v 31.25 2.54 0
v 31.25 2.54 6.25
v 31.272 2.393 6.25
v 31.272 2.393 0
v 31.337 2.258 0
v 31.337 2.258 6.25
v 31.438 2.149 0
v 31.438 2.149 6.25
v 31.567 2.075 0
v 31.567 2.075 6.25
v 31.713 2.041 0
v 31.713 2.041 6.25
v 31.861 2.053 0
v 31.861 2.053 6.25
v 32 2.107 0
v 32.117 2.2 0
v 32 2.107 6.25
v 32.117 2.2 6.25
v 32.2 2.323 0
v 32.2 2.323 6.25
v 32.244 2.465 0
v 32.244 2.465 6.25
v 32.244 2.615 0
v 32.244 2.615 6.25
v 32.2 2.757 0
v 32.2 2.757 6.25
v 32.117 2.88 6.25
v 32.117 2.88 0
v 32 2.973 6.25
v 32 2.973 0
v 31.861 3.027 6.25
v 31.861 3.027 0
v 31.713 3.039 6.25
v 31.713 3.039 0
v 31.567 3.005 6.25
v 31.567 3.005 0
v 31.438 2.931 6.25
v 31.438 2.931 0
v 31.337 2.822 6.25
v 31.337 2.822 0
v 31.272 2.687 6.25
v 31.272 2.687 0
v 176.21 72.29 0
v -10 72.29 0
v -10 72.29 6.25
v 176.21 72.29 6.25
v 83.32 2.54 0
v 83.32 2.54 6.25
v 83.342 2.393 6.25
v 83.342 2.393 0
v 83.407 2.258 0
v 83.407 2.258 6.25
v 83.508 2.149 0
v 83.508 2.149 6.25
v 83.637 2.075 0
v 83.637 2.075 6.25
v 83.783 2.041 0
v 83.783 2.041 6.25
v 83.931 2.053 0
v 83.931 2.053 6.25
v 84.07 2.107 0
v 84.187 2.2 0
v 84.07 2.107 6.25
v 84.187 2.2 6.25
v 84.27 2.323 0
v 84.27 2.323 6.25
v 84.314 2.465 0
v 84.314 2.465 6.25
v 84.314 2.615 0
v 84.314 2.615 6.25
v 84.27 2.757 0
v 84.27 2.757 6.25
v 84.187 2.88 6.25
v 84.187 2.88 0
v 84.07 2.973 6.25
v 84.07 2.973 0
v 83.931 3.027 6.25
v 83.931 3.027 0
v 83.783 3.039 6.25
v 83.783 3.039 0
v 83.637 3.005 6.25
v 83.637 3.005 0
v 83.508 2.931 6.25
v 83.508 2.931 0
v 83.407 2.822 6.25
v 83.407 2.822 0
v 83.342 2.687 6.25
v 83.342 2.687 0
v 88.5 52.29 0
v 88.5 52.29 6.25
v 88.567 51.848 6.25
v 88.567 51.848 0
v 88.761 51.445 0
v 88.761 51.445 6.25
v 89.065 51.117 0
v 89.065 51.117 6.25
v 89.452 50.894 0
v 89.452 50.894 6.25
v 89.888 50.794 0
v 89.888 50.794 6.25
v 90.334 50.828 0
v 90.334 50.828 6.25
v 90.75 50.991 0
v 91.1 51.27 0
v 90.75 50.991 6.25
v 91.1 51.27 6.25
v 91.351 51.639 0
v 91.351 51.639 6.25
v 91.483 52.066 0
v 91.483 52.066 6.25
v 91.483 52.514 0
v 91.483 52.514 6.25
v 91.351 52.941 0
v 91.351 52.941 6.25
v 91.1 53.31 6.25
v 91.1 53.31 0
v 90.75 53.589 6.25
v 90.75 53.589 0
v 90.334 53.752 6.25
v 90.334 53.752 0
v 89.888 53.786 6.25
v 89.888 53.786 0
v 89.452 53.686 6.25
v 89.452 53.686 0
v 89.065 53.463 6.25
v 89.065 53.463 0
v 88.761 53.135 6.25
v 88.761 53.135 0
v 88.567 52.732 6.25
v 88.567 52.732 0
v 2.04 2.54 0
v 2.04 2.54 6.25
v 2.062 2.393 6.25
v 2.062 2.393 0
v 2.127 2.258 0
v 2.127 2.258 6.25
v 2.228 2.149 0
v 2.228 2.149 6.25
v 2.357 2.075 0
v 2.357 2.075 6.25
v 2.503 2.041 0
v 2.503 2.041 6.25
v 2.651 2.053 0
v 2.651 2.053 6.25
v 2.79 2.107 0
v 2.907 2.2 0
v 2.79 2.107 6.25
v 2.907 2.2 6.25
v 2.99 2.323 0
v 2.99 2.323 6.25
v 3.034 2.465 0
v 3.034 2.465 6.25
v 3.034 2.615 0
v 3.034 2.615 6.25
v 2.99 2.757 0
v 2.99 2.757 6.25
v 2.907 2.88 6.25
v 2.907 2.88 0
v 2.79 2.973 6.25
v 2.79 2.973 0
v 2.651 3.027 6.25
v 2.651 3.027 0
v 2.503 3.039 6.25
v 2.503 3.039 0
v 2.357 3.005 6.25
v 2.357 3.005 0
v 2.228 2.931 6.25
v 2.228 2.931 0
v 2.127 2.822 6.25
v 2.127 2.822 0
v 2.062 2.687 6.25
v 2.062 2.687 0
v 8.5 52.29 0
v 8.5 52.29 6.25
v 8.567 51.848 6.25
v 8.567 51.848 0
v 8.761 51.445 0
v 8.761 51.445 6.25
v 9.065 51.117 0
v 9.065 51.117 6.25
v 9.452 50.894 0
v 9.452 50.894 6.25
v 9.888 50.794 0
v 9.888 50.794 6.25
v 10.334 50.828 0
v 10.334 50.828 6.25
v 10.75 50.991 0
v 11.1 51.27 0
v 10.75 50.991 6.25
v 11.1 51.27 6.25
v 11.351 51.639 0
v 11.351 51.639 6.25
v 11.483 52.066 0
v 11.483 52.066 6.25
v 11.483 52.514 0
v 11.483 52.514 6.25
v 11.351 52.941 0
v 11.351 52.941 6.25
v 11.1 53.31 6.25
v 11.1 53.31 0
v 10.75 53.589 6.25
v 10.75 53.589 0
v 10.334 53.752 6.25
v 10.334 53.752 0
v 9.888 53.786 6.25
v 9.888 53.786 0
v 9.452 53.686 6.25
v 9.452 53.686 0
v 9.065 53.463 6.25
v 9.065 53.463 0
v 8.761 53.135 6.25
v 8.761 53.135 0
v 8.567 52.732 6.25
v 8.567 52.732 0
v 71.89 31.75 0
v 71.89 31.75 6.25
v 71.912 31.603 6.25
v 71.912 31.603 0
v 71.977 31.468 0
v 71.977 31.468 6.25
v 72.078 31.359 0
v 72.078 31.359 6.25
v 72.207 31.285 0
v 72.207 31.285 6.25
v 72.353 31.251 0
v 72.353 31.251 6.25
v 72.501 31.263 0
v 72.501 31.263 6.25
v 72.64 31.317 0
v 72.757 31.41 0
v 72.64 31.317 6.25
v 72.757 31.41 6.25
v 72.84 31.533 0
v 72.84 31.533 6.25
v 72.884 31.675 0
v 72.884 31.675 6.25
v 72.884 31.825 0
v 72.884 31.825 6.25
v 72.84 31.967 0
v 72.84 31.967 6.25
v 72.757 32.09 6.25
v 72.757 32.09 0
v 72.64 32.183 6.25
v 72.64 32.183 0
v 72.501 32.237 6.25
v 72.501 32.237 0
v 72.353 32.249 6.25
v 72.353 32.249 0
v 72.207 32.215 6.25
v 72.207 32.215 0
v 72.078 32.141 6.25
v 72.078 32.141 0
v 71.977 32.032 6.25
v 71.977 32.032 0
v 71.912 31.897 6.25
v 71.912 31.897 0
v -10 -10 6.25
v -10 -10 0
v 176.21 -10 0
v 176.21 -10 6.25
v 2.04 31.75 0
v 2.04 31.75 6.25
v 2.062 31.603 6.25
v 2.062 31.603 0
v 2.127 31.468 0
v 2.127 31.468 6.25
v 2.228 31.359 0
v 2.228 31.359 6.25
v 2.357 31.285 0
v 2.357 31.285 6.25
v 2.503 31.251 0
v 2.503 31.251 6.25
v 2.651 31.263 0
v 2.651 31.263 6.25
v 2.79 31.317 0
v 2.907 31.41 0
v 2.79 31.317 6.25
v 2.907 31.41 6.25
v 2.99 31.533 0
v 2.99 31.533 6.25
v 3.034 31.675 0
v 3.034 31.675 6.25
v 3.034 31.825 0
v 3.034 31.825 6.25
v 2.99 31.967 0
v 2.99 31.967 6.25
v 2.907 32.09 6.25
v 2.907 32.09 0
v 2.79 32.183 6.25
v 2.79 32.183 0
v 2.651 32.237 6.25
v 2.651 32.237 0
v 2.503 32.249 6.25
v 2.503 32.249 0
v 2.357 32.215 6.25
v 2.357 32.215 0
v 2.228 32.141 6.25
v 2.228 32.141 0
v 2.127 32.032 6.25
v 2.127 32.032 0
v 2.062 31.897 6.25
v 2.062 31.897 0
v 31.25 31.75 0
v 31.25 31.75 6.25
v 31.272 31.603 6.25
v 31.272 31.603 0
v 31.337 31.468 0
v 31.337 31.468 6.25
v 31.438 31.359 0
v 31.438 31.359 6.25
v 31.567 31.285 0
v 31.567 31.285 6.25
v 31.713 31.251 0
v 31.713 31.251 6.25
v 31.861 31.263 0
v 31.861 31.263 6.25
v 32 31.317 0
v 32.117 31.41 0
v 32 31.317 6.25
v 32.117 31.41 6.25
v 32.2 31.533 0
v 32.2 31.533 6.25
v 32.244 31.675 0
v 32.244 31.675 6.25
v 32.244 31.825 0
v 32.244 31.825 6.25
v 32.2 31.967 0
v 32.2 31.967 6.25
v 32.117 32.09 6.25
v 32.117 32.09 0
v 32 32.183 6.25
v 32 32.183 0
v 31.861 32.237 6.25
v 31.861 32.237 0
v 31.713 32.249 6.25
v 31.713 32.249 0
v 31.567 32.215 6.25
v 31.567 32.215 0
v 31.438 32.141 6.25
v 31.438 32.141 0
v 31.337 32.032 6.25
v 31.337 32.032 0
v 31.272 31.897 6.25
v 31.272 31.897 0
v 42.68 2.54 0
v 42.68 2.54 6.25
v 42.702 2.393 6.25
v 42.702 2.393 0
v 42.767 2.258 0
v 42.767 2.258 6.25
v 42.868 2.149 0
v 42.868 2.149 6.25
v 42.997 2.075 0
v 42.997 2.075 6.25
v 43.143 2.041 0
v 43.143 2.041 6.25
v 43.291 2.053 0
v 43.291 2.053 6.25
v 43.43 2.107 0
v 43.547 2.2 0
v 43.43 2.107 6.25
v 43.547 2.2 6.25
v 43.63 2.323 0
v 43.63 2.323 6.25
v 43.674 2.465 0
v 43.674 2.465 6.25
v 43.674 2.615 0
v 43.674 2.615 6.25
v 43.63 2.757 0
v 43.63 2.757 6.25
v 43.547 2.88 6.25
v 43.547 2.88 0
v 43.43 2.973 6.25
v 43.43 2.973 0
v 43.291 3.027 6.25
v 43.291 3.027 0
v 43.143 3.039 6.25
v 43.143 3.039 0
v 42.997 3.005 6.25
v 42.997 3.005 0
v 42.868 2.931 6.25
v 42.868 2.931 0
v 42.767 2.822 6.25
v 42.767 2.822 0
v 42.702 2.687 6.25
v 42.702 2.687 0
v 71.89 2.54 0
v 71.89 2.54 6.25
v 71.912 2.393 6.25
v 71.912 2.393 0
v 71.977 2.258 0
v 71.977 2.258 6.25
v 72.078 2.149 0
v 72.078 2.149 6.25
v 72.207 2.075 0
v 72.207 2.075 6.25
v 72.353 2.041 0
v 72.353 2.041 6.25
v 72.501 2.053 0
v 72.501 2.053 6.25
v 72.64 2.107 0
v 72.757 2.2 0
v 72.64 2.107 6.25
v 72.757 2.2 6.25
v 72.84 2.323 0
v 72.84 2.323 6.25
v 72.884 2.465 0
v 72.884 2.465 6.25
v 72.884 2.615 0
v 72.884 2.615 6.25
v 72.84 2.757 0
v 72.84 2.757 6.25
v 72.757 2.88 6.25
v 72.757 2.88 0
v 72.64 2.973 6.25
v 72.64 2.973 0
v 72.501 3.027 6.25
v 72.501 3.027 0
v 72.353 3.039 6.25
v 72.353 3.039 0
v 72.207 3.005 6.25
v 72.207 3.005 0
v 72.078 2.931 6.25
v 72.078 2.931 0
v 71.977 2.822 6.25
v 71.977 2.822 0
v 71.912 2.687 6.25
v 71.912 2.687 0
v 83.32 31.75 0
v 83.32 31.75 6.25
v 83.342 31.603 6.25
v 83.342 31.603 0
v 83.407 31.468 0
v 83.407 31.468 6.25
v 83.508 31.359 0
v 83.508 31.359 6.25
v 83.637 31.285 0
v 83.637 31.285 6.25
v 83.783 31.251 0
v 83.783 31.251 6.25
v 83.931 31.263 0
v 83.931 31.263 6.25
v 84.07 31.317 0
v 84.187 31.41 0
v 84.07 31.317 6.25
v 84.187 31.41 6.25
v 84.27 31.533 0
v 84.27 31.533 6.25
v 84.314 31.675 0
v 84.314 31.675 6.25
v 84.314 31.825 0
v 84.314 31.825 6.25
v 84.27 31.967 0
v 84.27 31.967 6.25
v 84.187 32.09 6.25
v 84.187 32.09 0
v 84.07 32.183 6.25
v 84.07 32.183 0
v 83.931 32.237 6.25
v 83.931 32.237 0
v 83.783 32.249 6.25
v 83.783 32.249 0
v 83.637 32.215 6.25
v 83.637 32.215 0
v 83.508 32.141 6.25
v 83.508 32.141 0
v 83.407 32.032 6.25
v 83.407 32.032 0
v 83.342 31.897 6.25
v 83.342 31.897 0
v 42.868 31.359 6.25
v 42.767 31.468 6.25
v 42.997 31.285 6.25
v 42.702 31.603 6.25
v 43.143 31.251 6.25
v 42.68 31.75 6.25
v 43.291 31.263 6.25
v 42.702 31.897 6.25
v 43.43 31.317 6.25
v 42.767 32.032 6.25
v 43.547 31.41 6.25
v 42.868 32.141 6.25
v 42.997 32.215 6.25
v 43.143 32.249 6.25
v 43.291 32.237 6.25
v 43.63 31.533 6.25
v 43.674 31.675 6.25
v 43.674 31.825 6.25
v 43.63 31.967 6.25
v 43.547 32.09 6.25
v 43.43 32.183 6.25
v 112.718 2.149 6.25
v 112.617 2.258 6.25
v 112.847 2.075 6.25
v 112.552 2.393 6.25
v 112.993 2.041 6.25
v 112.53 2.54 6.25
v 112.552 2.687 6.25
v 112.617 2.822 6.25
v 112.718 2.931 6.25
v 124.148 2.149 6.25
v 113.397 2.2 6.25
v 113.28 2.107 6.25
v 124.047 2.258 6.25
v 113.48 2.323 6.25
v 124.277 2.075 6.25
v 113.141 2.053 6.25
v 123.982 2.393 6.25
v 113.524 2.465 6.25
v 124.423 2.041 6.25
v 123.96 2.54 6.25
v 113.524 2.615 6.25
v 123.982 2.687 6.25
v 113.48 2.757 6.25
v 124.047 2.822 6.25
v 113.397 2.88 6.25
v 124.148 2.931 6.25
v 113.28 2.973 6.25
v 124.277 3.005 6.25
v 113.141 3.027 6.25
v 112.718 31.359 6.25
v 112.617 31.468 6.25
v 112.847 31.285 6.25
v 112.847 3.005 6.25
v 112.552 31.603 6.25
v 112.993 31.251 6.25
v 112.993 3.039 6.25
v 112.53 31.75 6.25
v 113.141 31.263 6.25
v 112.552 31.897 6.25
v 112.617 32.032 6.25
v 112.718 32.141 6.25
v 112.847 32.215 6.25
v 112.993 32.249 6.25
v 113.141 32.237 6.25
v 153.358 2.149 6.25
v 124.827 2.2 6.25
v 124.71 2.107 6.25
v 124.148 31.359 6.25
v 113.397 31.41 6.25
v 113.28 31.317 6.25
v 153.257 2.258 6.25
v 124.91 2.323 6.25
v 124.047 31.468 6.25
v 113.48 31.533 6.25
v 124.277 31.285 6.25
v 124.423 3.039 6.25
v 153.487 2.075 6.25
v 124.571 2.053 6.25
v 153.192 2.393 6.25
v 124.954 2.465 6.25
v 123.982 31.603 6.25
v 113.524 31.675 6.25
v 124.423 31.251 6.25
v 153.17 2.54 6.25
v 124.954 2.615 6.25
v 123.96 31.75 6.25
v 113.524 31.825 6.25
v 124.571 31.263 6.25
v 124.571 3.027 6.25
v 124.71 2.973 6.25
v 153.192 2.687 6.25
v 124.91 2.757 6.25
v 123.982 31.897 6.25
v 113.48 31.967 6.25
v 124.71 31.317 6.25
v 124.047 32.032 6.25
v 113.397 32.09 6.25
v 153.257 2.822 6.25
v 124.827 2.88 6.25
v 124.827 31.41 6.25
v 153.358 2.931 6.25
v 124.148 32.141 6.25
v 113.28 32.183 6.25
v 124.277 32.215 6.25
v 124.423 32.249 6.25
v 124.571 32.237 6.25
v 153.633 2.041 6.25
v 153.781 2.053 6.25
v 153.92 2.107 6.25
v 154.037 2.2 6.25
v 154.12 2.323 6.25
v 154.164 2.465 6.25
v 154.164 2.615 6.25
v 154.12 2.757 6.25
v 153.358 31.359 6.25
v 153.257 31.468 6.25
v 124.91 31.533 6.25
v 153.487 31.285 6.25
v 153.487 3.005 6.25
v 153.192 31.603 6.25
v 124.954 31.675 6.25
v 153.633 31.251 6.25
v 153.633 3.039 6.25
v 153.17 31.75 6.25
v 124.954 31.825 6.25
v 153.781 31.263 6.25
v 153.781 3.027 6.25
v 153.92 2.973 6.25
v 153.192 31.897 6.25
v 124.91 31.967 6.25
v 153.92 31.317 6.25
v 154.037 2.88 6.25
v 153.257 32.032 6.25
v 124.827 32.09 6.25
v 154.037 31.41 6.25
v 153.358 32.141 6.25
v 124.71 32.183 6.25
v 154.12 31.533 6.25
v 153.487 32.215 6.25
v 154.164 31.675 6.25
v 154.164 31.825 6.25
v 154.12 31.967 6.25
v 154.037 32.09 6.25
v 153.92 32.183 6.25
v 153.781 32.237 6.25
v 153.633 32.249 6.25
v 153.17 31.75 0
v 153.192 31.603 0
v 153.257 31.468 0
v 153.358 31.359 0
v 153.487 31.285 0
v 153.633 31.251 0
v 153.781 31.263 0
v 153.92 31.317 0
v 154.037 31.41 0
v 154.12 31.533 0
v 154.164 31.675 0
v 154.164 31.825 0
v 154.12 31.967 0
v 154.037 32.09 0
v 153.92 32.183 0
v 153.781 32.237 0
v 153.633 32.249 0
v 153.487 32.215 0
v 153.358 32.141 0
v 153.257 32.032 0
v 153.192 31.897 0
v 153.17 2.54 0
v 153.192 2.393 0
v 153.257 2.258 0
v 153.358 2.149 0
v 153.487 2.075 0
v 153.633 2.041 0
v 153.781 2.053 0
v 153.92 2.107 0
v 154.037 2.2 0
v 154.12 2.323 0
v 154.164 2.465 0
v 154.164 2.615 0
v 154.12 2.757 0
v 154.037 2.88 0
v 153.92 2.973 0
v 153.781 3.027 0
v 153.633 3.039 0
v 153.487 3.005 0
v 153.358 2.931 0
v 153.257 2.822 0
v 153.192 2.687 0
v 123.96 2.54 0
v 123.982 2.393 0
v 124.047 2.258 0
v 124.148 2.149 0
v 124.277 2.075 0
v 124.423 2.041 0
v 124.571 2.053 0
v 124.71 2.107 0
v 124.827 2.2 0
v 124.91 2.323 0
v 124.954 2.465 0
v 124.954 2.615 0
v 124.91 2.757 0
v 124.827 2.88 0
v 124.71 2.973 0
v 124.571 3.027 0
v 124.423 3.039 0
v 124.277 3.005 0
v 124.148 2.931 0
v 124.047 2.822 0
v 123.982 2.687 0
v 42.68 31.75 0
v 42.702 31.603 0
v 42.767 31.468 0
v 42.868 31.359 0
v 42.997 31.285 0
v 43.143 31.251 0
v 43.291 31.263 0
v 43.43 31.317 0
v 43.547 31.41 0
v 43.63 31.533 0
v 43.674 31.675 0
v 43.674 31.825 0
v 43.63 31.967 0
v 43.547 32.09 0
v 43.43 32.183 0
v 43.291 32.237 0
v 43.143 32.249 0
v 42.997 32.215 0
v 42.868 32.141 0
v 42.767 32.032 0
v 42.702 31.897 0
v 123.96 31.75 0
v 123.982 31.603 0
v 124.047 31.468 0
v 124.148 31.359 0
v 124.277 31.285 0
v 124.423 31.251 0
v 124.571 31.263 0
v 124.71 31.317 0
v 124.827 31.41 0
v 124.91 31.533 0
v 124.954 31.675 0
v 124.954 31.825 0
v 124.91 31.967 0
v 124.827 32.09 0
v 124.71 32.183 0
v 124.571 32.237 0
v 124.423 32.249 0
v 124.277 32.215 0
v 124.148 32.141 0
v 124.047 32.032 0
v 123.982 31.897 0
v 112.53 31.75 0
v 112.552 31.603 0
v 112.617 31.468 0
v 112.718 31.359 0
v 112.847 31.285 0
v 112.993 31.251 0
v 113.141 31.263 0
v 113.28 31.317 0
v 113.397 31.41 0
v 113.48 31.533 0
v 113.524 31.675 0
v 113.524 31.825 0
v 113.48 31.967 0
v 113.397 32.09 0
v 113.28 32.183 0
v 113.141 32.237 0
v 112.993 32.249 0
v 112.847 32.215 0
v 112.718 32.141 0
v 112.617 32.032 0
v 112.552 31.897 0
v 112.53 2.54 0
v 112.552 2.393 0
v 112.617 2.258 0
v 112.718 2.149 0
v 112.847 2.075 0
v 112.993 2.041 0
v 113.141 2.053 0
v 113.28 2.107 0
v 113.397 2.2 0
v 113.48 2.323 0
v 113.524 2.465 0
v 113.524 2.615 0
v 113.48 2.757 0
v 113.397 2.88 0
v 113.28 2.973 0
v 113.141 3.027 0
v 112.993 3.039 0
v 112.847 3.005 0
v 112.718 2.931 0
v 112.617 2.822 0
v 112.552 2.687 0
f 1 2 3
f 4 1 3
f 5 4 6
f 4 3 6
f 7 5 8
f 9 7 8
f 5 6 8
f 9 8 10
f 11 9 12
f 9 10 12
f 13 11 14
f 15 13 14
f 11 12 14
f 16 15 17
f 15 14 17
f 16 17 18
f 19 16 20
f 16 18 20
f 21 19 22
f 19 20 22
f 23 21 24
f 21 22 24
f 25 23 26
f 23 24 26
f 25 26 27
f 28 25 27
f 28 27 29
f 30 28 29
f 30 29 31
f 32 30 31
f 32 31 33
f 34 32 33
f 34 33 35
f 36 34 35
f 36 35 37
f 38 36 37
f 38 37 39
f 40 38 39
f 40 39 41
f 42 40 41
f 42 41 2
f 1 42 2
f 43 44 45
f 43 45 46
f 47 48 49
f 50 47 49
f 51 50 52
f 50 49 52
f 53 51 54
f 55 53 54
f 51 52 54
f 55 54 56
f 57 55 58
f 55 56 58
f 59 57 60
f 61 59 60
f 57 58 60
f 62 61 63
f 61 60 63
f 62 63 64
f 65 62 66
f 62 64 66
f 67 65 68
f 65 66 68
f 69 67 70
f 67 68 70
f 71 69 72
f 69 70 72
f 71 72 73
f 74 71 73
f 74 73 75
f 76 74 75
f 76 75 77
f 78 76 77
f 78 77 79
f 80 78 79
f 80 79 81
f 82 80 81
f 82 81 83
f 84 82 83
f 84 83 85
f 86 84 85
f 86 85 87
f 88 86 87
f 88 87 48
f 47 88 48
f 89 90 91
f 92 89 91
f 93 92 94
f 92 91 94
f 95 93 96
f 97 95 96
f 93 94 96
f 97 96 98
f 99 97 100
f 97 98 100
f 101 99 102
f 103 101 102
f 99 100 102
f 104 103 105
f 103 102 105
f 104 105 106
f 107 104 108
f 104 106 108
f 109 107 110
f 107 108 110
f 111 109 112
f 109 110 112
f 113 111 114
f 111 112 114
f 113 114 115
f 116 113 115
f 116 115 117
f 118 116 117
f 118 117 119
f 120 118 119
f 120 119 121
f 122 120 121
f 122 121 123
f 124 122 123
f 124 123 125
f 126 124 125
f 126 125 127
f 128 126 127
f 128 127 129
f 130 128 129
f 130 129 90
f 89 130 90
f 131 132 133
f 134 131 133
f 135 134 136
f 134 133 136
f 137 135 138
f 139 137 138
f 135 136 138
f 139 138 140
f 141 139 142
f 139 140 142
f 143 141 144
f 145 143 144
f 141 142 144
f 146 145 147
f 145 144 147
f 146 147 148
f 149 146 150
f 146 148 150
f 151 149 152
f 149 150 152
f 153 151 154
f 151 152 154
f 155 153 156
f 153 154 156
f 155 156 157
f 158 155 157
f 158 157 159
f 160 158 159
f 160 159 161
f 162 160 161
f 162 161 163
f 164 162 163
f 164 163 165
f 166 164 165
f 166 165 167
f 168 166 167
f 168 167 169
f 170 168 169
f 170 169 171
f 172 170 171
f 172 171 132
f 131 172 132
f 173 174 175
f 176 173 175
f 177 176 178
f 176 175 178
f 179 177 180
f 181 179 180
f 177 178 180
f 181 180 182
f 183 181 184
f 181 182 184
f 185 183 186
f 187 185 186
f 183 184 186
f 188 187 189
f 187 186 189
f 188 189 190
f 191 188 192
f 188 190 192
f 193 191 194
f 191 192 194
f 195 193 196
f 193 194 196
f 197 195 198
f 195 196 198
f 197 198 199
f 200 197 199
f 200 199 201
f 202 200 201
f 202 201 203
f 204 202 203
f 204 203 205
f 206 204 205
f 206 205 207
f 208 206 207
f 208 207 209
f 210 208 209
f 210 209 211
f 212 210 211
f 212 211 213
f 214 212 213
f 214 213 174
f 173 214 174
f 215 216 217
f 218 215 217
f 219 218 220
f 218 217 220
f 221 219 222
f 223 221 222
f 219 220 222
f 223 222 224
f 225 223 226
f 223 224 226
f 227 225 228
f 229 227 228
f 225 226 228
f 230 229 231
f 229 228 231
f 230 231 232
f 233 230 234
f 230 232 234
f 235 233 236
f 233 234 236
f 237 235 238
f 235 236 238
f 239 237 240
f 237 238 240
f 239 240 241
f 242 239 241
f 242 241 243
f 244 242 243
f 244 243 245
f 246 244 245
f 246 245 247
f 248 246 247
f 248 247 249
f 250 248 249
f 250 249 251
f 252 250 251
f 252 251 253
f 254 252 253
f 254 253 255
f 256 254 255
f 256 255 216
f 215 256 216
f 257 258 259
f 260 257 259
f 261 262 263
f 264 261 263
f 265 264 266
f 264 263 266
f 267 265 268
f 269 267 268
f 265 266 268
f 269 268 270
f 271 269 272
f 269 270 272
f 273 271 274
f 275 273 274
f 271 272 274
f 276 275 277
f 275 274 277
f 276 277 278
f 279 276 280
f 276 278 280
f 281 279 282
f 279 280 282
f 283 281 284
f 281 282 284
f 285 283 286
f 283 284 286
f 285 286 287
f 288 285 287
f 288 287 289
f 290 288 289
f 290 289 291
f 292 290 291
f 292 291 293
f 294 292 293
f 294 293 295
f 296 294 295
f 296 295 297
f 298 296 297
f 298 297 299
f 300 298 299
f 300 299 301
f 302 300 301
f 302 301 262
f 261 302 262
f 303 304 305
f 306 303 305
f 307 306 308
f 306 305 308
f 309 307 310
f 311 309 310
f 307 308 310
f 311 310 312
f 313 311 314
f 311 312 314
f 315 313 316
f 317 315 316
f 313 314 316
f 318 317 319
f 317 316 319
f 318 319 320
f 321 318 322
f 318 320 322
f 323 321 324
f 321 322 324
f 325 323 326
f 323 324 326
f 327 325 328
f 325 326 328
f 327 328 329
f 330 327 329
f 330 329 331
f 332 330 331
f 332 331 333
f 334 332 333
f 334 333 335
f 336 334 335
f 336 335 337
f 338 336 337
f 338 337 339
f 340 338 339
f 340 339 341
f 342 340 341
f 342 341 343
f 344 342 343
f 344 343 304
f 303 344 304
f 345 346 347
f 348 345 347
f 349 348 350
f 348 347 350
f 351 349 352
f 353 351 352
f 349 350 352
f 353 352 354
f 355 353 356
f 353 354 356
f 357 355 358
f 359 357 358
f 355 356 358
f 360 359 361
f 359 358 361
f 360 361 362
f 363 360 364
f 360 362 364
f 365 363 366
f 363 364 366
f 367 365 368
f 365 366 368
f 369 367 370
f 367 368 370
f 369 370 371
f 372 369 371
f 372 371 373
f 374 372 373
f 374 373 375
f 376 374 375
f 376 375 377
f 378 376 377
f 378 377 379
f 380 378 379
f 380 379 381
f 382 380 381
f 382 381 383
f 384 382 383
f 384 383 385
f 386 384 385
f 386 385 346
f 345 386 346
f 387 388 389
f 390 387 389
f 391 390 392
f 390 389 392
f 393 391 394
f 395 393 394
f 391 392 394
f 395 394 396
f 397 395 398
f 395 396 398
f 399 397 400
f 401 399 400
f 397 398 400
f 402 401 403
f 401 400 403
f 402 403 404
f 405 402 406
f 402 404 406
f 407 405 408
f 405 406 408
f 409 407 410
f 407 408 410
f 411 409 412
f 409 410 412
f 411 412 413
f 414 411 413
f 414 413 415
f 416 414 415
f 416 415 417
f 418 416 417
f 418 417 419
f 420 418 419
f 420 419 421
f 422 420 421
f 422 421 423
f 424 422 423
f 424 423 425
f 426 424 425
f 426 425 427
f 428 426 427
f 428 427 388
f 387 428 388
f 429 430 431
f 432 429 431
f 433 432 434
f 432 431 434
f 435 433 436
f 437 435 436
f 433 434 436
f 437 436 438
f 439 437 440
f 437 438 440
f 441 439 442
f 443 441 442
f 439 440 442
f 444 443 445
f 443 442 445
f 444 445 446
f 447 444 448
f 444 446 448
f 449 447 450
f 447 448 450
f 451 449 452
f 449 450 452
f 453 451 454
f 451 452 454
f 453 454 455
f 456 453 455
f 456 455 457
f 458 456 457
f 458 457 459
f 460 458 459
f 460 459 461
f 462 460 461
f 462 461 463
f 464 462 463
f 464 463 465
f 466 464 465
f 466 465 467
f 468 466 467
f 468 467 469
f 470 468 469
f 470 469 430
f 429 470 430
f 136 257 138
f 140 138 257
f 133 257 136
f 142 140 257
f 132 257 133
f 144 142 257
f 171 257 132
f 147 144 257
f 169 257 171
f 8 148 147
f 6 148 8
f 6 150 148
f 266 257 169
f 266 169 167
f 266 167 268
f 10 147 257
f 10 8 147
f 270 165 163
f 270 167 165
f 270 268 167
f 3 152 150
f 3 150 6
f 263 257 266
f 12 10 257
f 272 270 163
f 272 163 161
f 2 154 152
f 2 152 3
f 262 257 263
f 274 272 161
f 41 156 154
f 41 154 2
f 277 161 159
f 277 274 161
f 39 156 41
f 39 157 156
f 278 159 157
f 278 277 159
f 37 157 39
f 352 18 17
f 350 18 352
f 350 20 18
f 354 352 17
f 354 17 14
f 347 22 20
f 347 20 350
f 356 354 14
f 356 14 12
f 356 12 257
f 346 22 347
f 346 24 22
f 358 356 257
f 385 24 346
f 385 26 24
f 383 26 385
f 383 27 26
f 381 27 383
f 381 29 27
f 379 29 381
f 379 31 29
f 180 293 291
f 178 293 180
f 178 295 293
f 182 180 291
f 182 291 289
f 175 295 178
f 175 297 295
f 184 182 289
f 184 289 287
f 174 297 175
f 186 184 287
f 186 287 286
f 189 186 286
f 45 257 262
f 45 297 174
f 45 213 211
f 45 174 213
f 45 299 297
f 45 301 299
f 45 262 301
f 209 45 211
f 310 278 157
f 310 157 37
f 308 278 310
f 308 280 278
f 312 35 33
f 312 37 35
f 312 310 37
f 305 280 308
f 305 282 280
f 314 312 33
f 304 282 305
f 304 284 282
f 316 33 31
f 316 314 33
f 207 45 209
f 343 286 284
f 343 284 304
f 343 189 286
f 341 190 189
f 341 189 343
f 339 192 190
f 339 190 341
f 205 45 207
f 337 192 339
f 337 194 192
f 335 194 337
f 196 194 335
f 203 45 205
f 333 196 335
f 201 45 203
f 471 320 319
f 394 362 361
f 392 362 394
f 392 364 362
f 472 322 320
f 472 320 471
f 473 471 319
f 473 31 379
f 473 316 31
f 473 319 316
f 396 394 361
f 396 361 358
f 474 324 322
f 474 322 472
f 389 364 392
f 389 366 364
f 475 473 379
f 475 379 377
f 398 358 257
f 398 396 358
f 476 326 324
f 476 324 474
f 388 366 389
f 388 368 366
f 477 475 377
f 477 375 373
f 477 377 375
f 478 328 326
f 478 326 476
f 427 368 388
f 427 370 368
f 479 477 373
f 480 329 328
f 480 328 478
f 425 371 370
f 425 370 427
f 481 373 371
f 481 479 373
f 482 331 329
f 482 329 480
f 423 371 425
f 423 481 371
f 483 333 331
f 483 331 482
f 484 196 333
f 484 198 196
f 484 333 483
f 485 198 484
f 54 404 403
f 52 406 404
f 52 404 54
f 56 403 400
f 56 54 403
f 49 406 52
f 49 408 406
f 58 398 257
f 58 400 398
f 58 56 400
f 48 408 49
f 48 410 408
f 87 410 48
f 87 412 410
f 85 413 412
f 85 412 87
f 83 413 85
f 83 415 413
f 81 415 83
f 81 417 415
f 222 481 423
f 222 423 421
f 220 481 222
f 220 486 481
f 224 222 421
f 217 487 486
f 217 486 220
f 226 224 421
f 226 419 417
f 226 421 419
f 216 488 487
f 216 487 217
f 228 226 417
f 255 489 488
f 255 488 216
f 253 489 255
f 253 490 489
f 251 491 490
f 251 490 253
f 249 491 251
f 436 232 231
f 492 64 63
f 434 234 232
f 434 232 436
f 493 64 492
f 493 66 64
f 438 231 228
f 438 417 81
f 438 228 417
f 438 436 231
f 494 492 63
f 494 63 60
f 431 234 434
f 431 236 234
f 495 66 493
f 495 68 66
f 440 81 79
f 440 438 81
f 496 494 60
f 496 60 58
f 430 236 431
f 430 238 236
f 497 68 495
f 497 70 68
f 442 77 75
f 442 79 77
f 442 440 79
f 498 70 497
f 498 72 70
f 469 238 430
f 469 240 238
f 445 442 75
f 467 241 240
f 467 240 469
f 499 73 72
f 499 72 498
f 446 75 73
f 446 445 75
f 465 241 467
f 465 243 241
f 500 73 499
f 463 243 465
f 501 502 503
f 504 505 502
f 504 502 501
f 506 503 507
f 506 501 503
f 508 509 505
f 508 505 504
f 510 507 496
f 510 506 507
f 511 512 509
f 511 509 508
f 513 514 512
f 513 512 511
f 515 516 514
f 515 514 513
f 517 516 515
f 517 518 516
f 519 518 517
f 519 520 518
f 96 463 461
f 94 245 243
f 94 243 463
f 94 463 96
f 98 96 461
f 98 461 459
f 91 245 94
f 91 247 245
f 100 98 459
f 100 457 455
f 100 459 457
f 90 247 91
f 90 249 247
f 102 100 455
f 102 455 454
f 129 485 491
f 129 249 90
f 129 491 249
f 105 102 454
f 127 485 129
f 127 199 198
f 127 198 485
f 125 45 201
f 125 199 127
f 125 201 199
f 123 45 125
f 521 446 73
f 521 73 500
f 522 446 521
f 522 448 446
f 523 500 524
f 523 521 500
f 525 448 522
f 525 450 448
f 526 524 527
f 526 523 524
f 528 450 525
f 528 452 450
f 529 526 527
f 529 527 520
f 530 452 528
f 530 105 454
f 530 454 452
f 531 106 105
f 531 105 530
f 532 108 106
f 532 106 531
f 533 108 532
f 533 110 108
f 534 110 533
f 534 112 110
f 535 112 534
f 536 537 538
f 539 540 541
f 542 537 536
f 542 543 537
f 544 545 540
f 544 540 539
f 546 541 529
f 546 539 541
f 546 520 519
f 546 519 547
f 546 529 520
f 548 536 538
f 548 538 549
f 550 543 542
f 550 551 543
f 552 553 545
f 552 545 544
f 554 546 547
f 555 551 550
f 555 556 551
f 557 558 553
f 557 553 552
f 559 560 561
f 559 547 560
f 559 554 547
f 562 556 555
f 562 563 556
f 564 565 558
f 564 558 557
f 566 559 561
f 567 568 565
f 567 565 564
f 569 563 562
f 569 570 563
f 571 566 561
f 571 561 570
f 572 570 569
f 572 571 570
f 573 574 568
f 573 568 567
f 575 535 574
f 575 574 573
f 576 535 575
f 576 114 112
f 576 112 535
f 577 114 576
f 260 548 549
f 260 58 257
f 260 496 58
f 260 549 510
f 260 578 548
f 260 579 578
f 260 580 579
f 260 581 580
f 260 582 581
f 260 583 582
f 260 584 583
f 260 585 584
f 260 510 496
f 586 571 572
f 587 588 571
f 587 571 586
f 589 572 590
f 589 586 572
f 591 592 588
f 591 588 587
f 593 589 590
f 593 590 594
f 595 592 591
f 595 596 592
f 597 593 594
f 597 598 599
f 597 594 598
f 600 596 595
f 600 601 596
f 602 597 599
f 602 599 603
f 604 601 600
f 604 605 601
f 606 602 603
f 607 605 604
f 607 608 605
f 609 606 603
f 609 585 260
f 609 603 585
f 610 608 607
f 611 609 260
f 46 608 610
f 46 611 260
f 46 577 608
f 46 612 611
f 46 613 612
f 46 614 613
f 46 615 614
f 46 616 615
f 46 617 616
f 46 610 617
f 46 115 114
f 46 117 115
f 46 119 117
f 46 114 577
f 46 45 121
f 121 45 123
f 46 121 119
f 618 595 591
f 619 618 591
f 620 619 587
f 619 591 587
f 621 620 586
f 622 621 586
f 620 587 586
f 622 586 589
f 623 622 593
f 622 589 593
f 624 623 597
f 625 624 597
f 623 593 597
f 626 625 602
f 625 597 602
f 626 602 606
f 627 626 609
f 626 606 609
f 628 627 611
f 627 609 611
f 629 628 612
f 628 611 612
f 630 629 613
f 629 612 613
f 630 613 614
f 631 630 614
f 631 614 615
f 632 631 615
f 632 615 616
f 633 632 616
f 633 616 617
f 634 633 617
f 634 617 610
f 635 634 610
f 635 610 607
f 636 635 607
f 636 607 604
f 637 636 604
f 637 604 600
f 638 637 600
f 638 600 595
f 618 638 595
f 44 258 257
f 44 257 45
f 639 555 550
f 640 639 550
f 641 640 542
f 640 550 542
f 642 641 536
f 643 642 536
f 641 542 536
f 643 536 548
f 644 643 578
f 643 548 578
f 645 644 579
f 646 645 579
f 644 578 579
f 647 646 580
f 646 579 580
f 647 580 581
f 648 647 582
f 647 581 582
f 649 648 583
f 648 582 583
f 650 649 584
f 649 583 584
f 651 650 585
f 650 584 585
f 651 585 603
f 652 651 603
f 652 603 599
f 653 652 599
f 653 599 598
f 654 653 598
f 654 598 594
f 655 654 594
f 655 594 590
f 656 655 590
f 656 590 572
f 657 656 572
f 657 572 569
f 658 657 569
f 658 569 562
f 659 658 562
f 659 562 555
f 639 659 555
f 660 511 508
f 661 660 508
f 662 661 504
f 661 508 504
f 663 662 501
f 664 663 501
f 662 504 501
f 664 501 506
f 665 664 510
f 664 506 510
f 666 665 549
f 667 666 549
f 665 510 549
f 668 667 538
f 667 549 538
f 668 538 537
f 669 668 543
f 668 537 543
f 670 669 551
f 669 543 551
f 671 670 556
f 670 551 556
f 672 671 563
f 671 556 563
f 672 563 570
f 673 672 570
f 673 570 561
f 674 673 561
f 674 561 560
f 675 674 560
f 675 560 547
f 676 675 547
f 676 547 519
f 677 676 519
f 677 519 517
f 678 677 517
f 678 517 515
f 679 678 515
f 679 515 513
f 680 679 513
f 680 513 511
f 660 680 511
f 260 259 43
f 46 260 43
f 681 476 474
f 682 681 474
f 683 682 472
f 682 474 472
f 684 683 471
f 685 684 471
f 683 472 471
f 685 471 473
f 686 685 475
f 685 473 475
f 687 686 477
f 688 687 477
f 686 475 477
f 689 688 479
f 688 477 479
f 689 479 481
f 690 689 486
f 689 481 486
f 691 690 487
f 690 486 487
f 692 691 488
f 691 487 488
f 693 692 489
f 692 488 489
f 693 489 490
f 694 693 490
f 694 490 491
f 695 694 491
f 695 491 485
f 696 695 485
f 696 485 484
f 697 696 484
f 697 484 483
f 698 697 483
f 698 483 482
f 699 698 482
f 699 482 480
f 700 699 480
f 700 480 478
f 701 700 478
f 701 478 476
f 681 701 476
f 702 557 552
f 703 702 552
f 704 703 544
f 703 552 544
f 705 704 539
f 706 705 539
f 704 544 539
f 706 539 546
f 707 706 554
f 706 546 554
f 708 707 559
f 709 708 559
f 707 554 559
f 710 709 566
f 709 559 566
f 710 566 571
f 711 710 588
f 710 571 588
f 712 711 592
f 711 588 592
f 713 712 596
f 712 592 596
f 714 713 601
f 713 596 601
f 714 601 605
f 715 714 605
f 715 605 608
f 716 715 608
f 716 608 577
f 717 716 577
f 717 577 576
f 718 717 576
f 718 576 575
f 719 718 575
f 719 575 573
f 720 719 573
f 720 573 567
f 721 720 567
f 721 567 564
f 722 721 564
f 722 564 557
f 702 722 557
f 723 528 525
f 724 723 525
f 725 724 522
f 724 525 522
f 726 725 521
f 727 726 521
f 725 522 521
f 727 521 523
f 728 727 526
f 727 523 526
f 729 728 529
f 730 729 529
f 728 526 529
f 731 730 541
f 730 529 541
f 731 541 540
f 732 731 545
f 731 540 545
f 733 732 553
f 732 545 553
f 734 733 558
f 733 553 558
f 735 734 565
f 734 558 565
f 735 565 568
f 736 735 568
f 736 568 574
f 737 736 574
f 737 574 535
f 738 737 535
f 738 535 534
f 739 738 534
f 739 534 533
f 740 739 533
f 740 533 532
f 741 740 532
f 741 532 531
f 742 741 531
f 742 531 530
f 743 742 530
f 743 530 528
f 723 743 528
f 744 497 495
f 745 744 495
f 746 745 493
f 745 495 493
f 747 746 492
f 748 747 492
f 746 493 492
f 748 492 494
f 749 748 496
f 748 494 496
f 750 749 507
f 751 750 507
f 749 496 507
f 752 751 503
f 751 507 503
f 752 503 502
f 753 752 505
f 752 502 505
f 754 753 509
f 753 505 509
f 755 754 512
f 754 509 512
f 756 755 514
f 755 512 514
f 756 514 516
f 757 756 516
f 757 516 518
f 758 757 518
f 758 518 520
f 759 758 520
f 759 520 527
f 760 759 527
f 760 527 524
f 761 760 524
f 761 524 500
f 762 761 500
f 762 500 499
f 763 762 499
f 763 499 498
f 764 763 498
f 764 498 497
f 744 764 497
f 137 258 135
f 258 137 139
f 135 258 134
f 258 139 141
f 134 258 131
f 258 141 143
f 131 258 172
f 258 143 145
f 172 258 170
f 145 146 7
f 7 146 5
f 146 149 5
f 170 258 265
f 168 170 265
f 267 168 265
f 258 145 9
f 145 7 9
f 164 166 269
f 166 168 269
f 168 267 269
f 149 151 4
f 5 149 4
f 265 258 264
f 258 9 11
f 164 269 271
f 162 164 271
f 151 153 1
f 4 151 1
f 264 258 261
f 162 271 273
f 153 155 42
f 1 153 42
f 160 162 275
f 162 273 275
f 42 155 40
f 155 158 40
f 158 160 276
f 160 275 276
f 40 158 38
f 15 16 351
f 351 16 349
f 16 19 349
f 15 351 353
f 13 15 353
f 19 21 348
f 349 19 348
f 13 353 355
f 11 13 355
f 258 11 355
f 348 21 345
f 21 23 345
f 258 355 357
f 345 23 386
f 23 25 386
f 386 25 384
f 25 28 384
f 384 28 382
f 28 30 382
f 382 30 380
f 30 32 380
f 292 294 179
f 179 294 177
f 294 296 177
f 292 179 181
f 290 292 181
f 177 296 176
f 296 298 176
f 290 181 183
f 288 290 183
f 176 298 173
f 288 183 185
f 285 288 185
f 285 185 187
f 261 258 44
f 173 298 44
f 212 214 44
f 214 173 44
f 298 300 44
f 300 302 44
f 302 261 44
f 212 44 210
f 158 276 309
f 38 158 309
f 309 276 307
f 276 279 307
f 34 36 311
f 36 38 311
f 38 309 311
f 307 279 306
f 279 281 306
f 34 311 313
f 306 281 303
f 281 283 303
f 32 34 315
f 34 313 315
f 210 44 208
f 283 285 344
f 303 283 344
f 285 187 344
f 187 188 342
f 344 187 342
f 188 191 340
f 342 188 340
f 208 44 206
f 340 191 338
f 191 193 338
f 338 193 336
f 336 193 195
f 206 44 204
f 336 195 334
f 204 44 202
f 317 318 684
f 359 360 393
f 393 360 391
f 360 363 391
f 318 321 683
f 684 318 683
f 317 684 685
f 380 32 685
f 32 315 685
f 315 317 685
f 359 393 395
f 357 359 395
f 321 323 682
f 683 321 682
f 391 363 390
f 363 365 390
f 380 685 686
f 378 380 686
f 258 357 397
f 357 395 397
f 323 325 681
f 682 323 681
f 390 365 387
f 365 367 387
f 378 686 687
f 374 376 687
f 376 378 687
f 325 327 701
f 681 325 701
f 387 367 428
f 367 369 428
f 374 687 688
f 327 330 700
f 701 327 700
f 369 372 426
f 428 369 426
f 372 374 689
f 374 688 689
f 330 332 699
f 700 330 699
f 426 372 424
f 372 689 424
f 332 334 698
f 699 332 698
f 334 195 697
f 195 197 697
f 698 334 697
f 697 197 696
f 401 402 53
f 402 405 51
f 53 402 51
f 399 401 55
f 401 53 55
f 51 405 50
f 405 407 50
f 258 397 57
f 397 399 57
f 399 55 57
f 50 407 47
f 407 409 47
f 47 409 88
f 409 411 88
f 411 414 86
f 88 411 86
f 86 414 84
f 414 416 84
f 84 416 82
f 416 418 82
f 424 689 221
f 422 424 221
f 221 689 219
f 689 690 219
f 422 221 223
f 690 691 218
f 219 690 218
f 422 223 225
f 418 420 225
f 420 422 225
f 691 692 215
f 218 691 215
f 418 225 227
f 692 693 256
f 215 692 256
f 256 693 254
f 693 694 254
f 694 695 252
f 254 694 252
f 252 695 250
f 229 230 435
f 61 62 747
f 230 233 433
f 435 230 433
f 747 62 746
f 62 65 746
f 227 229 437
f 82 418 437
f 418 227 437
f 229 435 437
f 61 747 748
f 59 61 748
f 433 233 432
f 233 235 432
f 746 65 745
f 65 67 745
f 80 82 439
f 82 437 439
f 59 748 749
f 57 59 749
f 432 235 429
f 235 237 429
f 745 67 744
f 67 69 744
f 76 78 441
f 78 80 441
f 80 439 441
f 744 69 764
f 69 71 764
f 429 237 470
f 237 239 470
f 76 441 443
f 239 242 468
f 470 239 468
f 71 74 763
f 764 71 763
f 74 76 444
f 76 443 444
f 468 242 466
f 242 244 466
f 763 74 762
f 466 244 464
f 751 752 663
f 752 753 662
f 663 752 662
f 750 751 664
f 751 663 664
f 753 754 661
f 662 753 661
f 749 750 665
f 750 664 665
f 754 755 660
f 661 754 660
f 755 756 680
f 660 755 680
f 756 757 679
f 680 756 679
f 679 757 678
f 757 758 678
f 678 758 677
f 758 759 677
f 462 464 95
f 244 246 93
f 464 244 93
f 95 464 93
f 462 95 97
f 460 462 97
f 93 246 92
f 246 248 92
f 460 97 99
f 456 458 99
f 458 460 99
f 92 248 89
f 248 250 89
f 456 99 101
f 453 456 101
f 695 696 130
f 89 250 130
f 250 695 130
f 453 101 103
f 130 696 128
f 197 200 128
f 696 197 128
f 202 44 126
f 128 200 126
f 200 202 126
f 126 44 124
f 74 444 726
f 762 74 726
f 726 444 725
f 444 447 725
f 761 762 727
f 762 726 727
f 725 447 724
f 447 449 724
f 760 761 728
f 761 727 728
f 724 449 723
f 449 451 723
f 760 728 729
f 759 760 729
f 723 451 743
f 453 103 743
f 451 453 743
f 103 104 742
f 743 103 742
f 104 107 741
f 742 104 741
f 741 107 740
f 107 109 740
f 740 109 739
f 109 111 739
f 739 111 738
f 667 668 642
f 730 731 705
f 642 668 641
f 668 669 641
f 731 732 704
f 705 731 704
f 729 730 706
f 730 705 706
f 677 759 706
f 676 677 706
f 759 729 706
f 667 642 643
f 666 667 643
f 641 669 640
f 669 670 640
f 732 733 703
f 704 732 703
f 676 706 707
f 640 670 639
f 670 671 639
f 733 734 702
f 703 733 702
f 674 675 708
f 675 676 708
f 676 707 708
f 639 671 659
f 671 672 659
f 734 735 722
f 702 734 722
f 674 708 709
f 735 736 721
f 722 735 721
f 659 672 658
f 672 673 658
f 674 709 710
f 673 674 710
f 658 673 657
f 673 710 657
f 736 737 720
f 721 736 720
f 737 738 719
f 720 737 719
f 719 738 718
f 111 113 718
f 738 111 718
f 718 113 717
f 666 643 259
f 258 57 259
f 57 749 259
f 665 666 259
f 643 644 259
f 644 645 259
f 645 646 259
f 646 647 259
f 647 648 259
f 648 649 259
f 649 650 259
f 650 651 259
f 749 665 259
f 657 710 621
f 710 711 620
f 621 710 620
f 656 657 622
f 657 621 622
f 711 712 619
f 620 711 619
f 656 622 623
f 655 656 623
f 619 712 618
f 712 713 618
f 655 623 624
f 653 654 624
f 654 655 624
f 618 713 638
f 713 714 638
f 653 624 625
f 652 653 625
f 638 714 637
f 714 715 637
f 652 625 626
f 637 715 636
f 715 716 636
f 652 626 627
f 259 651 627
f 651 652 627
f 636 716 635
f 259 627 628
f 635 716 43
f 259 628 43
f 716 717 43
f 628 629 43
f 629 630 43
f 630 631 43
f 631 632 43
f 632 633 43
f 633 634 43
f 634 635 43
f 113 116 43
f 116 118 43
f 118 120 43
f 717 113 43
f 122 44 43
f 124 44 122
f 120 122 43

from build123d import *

# Parameters (mm, degrees)
F0_W     = 186.21
F0_H     = 82.29
F1_DEPTH = 6.25
F2_D     = 1
F3_D     = 3


with BuildPart() as f1:
    # F0 (on Top) → F1 (new body)
    with BuildSketch(Plane.XY):
        with Locations((83.105, 31.145)):
            Rectangle(F0_W, F0_H)
    extrude(amount=F1_DEPTH)

    # F2 (through all)
    with Locations(Plane(origin=(0, 0, 0), x_dir=(1, 0, 0), z_dir=(0, 0, -1))):
        with Locations((2.54, -2.54), (2.54, -31.75), (31.75, -31.75), (31.75, -2.54), (43.18, -2.54), (43.18, -31.75), (72.39, -31.75), (72.39, -2.54), (83.82, -2.54), (83.82, -31.75), (113.03, -31.75), (113.03, -2.54), (124.46, -2.54), (124.46, -31.75), (153.67, -31.75), (153.67, -2.54)):
            Hole(F2_D / 2)

    # F3 (through all)
    with Locations(Plane(origin=(0, 0, 0), x_dir=(1, 0, 0), z_dir=(0, 0, -1))):
        with Locations((10, -52.29), (90, -52.29)):
            Hole(F3_D / 2)


solid = f1.part
